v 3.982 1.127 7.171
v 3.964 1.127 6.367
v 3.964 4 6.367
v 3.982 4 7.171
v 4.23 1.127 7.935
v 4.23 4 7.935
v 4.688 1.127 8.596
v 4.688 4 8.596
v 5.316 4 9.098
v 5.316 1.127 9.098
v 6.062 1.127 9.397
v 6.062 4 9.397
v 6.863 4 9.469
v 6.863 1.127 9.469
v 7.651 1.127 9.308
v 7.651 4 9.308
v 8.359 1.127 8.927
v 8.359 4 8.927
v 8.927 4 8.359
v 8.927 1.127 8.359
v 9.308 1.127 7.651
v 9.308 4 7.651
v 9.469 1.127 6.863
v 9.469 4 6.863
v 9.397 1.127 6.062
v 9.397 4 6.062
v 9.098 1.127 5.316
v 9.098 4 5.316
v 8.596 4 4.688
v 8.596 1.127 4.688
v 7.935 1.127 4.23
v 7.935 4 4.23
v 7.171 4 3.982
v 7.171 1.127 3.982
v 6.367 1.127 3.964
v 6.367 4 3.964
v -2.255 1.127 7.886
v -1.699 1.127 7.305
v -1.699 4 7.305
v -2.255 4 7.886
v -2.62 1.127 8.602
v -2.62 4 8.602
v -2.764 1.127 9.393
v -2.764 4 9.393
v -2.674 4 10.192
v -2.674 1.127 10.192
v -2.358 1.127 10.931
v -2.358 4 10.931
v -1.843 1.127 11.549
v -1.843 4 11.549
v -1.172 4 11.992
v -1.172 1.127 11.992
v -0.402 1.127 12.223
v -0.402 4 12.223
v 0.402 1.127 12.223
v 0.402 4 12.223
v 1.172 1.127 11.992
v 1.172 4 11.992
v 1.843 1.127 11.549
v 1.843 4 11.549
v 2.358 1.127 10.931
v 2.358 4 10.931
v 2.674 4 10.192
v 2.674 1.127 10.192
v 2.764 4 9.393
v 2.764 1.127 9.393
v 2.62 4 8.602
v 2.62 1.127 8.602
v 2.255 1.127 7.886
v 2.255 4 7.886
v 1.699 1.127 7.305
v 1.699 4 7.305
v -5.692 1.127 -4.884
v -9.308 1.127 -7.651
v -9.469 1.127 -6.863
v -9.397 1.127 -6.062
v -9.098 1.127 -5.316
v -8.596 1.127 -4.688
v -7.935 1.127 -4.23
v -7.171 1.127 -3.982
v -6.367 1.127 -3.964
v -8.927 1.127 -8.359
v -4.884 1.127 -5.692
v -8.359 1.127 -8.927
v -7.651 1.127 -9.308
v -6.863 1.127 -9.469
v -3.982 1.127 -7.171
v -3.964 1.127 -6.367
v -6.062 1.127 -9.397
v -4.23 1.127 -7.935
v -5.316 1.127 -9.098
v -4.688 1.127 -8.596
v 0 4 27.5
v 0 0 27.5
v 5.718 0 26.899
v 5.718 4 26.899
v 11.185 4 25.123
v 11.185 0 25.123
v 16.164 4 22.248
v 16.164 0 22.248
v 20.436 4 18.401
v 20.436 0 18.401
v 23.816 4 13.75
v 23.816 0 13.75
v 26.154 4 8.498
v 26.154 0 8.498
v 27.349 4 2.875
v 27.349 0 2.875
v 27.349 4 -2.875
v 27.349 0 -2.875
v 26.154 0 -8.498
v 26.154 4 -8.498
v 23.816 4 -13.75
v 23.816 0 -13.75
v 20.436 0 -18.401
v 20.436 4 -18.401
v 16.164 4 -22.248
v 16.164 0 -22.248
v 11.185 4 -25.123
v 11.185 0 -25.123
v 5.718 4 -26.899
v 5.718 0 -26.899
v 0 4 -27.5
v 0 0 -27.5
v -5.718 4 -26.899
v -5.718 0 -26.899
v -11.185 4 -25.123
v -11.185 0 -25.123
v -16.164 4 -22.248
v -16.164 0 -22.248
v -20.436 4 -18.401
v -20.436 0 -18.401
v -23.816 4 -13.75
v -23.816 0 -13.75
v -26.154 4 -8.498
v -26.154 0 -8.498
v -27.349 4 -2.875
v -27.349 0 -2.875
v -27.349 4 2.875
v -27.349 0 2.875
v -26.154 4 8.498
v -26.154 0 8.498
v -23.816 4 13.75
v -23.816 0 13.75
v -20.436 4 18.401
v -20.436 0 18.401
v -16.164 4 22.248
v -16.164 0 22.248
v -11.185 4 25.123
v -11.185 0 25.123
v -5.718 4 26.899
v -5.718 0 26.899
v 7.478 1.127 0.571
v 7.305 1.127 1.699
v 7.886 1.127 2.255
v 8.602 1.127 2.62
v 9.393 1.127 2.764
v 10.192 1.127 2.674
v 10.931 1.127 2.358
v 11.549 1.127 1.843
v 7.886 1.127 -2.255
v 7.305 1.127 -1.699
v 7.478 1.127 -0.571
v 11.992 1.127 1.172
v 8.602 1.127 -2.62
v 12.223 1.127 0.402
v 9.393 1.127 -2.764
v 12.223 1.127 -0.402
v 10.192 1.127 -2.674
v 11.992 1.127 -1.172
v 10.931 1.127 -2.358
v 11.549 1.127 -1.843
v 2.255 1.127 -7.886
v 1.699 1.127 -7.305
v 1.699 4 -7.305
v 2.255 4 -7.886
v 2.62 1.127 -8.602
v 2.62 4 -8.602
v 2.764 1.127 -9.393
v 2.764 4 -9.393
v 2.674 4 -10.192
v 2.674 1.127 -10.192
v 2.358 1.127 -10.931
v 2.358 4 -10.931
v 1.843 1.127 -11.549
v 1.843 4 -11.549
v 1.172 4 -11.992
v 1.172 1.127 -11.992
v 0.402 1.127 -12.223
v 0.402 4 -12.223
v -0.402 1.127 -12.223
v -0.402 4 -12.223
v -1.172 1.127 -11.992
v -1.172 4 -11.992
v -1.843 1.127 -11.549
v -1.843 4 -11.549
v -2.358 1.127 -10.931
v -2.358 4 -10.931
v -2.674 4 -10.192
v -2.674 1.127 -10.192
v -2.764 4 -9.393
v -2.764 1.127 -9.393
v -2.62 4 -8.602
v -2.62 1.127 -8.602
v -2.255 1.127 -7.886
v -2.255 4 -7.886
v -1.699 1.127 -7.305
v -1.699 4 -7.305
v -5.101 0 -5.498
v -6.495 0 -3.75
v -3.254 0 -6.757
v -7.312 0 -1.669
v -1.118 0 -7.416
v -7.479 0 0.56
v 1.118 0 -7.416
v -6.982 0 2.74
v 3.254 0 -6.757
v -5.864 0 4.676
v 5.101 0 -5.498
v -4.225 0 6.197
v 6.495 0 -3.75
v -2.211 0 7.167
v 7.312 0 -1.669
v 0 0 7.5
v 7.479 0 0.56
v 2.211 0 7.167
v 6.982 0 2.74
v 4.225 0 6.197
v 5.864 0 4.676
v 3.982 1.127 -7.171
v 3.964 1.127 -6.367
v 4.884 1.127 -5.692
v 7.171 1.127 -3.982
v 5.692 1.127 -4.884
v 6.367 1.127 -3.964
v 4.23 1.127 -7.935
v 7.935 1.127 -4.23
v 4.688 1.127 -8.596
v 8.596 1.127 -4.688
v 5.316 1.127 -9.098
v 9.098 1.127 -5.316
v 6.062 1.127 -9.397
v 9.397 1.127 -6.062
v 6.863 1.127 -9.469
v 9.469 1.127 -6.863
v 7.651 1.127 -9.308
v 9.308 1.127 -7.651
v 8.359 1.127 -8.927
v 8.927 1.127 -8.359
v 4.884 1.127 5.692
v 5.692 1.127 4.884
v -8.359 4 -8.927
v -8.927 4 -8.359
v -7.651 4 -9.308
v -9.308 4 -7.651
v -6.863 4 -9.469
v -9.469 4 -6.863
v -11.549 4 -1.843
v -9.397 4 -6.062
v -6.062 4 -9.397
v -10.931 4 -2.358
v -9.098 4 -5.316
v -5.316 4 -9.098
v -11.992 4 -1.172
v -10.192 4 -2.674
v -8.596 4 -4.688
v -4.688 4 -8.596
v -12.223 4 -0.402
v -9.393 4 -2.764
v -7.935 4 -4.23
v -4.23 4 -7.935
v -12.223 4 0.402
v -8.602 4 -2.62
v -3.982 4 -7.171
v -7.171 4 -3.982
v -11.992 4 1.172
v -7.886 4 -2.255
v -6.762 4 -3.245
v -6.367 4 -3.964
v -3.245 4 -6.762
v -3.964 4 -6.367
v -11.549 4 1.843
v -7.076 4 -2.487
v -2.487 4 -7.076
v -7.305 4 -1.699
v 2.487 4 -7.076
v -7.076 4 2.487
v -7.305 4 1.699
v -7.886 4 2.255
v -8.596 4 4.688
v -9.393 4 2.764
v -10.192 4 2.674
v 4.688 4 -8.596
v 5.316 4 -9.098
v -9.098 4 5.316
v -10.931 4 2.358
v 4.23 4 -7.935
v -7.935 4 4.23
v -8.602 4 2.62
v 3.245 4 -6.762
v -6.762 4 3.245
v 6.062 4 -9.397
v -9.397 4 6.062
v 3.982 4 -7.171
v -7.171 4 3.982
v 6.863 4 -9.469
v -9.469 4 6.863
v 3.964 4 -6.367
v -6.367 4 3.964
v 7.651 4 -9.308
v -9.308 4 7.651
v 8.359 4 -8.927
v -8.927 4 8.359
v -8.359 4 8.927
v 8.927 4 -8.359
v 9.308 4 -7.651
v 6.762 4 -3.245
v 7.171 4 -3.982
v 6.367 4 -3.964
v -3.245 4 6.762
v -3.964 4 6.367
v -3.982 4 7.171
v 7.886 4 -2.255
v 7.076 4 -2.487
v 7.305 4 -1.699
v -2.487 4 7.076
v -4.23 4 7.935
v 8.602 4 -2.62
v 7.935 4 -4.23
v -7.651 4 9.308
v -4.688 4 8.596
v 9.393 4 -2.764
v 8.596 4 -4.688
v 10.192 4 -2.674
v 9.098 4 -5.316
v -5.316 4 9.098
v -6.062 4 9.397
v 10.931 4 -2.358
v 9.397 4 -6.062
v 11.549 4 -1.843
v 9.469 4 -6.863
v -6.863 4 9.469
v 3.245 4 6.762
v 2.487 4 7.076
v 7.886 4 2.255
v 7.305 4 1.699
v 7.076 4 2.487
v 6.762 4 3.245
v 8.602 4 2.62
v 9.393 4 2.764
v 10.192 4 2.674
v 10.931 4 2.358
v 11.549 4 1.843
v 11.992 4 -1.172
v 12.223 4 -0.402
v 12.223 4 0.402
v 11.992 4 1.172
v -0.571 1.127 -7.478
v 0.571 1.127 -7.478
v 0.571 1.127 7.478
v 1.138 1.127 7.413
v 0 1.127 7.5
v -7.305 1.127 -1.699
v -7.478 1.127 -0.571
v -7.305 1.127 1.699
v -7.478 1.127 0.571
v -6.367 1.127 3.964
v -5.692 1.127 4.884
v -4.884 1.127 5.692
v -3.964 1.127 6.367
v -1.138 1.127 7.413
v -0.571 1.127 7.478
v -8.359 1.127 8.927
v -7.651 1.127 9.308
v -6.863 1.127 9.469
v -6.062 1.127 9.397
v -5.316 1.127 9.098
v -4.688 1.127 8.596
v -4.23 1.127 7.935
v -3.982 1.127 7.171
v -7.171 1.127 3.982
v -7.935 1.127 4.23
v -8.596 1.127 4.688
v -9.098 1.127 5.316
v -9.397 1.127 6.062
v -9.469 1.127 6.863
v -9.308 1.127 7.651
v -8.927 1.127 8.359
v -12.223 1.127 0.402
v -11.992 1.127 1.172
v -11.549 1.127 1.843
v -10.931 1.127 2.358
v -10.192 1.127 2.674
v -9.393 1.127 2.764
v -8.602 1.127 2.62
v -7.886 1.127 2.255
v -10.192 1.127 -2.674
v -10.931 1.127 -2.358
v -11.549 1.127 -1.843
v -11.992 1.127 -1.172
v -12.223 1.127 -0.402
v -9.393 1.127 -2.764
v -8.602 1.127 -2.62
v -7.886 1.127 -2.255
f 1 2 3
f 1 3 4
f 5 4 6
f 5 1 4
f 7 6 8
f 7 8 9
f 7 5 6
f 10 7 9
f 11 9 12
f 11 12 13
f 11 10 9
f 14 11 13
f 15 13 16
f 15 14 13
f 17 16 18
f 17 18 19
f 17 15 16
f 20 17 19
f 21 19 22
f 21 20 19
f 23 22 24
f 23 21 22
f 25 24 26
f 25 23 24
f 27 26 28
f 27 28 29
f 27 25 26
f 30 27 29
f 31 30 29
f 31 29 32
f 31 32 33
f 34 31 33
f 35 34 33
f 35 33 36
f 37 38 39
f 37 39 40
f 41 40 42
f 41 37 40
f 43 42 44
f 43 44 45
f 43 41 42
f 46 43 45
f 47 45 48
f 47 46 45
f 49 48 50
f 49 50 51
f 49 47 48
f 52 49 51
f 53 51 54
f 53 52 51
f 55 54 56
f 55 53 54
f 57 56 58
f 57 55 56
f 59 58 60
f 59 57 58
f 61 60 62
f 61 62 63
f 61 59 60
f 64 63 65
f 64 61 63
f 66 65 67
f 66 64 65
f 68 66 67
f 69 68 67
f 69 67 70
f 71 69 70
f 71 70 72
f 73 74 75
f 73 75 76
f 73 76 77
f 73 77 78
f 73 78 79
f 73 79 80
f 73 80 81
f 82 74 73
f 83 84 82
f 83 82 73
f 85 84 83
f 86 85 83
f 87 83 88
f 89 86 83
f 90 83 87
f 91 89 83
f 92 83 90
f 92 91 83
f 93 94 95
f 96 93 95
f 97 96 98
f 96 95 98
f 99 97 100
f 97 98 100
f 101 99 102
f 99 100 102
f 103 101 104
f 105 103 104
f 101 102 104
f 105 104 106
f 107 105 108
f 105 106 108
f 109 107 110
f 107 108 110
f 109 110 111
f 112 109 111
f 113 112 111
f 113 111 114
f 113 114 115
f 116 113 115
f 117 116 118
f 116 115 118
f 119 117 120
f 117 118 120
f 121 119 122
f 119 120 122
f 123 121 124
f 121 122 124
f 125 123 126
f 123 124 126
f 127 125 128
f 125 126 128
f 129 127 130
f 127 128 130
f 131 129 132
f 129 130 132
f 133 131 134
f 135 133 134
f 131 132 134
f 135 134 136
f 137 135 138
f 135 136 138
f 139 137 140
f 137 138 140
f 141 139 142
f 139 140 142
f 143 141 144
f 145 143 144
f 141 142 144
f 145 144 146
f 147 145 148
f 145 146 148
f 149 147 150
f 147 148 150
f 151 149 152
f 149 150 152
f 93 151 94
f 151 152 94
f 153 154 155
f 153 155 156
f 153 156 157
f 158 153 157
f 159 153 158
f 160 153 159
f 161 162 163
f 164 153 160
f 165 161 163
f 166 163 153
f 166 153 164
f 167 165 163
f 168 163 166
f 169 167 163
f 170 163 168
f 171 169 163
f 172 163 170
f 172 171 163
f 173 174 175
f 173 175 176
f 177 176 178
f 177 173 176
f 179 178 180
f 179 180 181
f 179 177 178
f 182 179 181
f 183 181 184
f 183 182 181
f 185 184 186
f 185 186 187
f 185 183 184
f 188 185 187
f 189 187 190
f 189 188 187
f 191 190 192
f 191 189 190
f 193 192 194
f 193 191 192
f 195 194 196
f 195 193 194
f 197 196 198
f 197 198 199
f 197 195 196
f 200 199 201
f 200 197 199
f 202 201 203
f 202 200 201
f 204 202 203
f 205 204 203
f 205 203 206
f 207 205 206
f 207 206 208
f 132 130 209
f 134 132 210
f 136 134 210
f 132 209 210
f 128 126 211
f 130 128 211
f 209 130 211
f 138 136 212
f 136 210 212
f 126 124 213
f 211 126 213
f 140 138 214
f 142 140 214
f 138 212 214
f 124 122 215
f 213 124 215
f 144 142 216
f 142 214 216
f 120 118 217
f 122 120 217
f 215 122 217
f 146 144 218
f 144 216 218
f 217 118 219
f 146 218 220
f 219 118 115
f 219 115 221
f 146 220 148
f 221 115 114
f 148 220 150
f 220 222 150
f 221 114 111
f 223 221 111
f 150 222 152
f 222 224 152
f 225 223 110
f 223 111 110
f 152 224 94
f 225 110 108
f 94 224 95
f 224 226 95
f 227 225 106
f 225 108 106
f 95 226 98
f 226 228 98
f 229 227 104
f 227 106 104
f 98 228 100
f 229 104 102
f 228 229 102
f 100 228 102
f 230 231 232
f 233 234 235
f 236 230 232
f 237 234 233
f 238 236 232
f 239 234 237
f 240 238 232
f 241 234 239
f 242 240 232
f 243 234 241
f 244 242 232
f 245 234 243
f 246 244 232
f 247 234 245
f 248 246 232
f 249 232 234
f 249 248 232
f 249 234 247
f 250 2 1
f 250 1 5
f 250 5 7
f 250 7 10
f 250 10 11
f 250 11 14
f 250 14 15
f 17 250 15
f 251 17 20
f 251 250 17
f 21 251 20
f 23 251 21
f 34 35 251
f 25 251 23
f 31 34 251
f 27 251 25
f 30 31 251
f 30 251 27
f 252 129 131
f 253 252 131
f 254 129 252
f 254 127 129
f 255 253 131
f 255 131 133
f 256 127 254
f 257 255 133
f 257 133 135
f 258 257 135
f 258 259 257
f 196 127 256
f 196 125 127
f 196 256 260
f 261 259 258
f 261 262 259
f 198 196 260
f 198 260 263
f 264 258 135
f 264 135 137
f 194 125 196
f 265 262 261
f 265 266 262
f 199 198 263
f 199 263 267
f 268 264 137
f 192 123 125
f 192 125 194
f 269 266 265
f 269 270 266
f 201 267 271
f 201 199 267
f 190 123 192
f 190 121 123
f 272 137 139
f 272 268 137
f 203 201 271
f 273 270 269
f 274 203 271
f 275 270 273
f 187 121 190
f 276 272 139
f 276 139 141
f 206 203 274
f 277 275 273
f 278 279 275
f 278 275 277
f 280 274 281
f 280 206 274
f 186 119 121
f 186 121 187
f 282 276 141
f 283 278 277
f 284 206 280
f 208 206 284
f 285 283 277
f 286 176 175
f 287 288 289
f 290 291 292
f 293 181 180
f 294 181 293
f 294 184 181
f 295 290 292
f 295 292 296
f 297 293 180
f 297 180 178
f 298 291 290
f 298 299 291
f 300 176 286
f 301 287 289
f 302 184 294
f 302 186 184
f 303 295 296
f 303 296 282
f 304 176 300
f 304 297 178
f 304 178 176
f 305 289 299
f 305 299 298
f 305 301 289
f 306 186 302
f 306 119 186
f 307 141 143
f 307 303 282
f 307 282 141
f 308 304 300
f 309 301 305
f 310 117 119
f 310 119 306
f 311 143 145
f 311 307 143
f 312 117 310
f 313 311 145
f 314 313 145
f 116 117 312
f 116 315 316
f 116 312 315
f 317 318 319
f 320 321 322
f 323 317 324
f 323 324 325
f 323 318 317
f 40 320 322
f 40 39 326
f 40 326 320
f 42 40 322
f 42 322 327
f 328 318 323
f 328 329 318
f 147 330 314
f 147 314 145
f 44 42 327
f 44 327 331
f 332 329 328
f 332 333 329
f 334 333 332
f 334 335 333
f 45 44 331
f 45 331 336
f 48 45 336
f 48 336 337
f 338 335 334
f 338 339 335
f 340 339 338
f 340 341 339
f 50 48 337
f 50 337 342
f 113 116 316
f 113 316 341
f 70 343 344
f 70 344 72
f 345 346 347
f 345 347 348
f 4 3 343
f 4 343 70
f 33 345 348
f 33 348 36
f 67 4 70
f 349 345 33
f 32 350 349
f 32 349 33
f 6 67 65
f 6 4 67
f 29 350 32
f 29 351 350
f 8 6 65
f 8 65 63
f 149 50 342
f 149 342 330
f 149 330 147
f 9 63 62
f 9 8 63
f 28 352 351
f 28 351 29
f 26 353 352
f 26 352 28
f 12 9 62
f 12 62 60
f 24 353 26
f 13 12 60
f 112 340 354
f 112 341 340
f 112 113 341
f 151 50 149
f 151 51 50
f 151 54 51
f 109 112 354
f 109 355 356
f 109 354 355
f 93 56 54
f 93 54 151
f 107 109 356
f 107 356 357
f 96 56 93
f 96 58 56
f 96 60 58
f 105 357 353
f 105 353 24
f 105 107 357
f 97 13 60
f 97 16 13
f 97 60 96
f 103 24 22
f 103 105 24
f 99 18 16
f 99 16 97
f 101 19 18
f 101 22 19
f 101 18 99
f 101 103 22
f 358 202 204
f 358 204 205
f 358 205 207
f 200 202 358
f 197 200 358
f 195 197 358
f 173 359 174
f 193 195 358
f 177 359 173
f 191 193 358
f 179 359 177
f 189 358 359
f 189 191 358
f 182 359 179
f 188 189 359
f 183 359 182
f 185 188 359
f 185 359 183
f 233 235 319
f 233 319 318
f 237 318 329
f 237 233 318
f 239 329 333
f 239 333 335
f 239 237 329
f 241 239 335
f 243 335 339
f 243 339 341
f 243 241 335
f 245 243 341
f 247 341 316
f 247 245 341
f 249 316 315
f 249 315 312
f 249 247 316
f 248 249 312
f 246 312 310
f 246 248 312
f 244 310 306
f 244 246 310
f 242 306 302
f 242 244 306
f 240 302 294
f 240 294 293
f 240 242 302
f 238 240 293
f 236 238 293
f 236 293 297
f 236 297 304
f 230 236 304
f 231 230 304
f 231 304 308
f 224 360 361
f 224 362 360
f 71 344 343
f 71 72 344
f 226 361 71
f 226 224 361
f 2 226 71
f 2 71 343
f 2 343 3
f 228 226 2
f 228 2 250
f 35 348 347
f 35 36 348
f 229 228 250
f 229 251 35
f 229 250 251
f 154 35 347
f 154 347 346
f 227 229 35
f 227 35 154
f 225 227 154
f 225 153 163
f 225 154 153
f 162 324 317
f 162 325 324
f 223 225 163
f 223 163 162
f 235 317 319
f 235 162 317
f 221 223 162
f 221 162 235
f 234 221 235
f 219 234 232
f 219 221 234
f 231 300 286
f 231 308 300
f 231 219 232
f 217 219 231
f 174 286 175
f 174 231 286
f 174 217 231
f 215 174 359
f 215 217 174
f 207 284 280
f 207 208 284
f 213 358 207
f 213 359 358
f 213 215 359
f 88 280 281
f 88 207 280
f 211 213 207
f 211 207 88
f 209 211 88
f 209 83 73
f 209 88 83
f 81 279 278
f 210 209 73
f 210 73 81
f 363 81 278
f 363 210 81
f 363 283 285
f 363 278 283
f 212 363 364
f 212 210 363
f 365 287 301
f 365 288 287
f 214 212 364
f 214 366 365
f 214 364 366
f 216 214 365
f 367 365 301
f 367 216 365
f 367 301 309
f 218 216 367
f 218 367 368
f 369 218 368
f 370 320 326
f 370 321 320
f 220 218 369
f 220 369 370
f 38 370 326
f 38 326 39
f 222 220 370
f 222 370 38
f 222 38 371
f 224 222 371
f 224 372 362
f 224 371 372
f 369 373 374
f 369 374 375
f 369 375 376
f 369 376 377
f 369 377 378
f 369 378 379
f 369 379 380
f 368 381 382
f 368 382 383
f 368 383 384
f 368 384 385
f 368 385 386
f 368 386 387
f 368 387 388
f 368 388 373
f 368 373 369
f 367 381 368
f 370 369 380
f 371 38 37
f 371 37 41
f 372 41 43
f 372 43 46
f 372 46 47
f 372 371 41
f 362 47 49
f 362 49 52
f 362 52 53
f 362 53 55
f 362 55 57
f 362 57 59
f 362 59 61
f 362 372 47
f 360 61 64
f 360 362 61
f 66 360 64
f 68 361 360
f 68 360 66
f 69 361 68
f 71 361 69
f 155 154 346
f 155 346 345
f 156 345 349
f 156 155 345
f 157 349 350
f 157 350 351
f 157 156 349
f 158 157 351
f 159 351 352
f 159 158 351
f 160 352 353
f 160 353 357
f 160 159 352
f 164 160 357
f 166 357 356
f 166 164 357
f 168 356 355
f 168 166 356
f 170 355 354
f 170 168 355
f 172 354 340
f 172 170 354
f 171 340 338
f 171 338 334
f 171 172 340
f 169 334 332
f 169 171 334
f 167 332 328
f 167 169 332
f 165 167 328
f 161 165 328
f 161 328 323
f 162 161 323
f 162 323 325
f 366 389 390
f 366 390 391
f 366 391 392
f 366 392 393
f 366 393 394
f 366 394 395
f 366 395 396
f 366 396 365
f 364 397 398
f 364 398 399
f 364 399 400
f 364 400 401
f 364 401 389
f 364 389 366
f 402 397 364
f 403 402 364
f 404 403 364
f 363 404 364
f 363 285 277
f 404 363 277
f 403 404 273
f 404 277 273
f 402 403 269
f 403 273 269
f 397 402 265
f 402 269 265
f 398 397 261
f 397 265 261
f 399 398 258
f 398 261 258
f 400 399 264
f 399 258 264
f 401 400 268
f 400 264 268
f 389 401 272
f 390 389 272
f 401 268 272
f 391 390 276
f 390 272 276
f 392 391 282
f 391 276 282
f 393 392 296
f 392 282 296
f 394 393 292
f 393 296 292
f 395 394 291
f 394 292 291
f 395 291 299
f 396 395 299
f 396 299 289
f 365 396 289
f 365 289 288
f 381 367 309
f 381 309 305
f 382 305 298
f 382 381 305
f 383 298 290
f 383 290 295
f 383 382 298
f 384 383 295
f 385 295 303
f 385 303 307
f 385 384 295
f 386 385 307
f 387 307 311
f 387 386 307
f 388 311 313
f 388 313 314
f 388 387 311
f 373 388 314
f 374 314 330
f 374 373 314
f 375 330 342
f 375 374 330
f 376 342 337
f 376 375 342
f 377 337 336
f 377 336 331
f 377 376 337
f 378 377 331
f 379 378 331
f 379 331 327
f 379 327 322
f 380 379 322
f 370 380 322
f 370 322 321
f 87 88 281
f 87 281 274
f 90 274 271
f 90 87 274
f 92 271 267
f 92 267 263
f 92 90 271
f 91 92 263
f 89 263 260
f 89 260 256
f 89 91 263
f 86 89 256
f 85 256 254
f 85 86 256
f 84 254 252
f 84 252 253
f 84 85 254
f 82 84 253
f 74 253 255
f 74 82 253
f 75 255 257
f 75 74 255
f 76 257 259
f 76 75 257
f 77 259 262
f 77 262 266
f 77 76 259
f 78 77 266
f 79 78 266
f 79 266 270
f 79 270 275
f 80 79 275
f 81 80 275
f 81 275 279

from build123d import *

# Parameters (mm, degrees)
SKETCH1_R           = 27.5
BOSS_EXTRUDE1_DEPTH = 4
SKETCH2_R           = 7.5
CUT_EXTRUDE1_DEPTH  = 40.096035605
SKETCH3_R           = 2.765377474
CUT_EXTRUDE2_DEPTH  = 2.872516315
CIRPATTERN1_COUNT   = 8


with BuildPart() as part:
    # Sketch1 → Boss-Extrude1 (new body)
    with BuildSketch(Plane(origin=(0, 0, 0), x_dir=(1, 0, 0), z_dir=(0, 1, 0))):
        Circle(SKETCH1_R)
    extrude(amount=BOSS_EXTRUDE1_DEPTH)

    # Sketch2 → Cut-Extrude1 (cut, through all)
    with BuildSketch(Plane(origin=(0, 0, 0), x_dir=(1, 0, 0), z_dir=(0, 1, 0))):
        Circle(SKETCH2_R)
    extrude(amount=CUT_EXTRUDE1_DEPTH, mode=Mode.SUBTRACT)

    # Sketch3 → Cut-Extrude2 (cut)
    with BuildSketch(Plane(origin=(0, 4, 0), x_dir=(1, 0, 0), z_dir=(0, 1, 0))):
        with Locations((-9.486828159, 0)):
            Circle(SKETCH3_R)
    cut_extrude2 = extrude(amount=-CUT_EXTRUDE2_DEPTH, mode=Mode.SUBTRACT)

    # CirPattern1: Cut-Extrude2 ×8 about axis
    cirpattern1_axis = Axis((0, 0, 0), (0, 1, 0))
    for i in range(1, CIRPATTERN1_COUNT):
        add(cut_extrude2.rotate(cirpattern1_axis, i * 360 / CIRPATTERN1_COUNT), mode=Mode.SUBTRACT)


solid = part.part
